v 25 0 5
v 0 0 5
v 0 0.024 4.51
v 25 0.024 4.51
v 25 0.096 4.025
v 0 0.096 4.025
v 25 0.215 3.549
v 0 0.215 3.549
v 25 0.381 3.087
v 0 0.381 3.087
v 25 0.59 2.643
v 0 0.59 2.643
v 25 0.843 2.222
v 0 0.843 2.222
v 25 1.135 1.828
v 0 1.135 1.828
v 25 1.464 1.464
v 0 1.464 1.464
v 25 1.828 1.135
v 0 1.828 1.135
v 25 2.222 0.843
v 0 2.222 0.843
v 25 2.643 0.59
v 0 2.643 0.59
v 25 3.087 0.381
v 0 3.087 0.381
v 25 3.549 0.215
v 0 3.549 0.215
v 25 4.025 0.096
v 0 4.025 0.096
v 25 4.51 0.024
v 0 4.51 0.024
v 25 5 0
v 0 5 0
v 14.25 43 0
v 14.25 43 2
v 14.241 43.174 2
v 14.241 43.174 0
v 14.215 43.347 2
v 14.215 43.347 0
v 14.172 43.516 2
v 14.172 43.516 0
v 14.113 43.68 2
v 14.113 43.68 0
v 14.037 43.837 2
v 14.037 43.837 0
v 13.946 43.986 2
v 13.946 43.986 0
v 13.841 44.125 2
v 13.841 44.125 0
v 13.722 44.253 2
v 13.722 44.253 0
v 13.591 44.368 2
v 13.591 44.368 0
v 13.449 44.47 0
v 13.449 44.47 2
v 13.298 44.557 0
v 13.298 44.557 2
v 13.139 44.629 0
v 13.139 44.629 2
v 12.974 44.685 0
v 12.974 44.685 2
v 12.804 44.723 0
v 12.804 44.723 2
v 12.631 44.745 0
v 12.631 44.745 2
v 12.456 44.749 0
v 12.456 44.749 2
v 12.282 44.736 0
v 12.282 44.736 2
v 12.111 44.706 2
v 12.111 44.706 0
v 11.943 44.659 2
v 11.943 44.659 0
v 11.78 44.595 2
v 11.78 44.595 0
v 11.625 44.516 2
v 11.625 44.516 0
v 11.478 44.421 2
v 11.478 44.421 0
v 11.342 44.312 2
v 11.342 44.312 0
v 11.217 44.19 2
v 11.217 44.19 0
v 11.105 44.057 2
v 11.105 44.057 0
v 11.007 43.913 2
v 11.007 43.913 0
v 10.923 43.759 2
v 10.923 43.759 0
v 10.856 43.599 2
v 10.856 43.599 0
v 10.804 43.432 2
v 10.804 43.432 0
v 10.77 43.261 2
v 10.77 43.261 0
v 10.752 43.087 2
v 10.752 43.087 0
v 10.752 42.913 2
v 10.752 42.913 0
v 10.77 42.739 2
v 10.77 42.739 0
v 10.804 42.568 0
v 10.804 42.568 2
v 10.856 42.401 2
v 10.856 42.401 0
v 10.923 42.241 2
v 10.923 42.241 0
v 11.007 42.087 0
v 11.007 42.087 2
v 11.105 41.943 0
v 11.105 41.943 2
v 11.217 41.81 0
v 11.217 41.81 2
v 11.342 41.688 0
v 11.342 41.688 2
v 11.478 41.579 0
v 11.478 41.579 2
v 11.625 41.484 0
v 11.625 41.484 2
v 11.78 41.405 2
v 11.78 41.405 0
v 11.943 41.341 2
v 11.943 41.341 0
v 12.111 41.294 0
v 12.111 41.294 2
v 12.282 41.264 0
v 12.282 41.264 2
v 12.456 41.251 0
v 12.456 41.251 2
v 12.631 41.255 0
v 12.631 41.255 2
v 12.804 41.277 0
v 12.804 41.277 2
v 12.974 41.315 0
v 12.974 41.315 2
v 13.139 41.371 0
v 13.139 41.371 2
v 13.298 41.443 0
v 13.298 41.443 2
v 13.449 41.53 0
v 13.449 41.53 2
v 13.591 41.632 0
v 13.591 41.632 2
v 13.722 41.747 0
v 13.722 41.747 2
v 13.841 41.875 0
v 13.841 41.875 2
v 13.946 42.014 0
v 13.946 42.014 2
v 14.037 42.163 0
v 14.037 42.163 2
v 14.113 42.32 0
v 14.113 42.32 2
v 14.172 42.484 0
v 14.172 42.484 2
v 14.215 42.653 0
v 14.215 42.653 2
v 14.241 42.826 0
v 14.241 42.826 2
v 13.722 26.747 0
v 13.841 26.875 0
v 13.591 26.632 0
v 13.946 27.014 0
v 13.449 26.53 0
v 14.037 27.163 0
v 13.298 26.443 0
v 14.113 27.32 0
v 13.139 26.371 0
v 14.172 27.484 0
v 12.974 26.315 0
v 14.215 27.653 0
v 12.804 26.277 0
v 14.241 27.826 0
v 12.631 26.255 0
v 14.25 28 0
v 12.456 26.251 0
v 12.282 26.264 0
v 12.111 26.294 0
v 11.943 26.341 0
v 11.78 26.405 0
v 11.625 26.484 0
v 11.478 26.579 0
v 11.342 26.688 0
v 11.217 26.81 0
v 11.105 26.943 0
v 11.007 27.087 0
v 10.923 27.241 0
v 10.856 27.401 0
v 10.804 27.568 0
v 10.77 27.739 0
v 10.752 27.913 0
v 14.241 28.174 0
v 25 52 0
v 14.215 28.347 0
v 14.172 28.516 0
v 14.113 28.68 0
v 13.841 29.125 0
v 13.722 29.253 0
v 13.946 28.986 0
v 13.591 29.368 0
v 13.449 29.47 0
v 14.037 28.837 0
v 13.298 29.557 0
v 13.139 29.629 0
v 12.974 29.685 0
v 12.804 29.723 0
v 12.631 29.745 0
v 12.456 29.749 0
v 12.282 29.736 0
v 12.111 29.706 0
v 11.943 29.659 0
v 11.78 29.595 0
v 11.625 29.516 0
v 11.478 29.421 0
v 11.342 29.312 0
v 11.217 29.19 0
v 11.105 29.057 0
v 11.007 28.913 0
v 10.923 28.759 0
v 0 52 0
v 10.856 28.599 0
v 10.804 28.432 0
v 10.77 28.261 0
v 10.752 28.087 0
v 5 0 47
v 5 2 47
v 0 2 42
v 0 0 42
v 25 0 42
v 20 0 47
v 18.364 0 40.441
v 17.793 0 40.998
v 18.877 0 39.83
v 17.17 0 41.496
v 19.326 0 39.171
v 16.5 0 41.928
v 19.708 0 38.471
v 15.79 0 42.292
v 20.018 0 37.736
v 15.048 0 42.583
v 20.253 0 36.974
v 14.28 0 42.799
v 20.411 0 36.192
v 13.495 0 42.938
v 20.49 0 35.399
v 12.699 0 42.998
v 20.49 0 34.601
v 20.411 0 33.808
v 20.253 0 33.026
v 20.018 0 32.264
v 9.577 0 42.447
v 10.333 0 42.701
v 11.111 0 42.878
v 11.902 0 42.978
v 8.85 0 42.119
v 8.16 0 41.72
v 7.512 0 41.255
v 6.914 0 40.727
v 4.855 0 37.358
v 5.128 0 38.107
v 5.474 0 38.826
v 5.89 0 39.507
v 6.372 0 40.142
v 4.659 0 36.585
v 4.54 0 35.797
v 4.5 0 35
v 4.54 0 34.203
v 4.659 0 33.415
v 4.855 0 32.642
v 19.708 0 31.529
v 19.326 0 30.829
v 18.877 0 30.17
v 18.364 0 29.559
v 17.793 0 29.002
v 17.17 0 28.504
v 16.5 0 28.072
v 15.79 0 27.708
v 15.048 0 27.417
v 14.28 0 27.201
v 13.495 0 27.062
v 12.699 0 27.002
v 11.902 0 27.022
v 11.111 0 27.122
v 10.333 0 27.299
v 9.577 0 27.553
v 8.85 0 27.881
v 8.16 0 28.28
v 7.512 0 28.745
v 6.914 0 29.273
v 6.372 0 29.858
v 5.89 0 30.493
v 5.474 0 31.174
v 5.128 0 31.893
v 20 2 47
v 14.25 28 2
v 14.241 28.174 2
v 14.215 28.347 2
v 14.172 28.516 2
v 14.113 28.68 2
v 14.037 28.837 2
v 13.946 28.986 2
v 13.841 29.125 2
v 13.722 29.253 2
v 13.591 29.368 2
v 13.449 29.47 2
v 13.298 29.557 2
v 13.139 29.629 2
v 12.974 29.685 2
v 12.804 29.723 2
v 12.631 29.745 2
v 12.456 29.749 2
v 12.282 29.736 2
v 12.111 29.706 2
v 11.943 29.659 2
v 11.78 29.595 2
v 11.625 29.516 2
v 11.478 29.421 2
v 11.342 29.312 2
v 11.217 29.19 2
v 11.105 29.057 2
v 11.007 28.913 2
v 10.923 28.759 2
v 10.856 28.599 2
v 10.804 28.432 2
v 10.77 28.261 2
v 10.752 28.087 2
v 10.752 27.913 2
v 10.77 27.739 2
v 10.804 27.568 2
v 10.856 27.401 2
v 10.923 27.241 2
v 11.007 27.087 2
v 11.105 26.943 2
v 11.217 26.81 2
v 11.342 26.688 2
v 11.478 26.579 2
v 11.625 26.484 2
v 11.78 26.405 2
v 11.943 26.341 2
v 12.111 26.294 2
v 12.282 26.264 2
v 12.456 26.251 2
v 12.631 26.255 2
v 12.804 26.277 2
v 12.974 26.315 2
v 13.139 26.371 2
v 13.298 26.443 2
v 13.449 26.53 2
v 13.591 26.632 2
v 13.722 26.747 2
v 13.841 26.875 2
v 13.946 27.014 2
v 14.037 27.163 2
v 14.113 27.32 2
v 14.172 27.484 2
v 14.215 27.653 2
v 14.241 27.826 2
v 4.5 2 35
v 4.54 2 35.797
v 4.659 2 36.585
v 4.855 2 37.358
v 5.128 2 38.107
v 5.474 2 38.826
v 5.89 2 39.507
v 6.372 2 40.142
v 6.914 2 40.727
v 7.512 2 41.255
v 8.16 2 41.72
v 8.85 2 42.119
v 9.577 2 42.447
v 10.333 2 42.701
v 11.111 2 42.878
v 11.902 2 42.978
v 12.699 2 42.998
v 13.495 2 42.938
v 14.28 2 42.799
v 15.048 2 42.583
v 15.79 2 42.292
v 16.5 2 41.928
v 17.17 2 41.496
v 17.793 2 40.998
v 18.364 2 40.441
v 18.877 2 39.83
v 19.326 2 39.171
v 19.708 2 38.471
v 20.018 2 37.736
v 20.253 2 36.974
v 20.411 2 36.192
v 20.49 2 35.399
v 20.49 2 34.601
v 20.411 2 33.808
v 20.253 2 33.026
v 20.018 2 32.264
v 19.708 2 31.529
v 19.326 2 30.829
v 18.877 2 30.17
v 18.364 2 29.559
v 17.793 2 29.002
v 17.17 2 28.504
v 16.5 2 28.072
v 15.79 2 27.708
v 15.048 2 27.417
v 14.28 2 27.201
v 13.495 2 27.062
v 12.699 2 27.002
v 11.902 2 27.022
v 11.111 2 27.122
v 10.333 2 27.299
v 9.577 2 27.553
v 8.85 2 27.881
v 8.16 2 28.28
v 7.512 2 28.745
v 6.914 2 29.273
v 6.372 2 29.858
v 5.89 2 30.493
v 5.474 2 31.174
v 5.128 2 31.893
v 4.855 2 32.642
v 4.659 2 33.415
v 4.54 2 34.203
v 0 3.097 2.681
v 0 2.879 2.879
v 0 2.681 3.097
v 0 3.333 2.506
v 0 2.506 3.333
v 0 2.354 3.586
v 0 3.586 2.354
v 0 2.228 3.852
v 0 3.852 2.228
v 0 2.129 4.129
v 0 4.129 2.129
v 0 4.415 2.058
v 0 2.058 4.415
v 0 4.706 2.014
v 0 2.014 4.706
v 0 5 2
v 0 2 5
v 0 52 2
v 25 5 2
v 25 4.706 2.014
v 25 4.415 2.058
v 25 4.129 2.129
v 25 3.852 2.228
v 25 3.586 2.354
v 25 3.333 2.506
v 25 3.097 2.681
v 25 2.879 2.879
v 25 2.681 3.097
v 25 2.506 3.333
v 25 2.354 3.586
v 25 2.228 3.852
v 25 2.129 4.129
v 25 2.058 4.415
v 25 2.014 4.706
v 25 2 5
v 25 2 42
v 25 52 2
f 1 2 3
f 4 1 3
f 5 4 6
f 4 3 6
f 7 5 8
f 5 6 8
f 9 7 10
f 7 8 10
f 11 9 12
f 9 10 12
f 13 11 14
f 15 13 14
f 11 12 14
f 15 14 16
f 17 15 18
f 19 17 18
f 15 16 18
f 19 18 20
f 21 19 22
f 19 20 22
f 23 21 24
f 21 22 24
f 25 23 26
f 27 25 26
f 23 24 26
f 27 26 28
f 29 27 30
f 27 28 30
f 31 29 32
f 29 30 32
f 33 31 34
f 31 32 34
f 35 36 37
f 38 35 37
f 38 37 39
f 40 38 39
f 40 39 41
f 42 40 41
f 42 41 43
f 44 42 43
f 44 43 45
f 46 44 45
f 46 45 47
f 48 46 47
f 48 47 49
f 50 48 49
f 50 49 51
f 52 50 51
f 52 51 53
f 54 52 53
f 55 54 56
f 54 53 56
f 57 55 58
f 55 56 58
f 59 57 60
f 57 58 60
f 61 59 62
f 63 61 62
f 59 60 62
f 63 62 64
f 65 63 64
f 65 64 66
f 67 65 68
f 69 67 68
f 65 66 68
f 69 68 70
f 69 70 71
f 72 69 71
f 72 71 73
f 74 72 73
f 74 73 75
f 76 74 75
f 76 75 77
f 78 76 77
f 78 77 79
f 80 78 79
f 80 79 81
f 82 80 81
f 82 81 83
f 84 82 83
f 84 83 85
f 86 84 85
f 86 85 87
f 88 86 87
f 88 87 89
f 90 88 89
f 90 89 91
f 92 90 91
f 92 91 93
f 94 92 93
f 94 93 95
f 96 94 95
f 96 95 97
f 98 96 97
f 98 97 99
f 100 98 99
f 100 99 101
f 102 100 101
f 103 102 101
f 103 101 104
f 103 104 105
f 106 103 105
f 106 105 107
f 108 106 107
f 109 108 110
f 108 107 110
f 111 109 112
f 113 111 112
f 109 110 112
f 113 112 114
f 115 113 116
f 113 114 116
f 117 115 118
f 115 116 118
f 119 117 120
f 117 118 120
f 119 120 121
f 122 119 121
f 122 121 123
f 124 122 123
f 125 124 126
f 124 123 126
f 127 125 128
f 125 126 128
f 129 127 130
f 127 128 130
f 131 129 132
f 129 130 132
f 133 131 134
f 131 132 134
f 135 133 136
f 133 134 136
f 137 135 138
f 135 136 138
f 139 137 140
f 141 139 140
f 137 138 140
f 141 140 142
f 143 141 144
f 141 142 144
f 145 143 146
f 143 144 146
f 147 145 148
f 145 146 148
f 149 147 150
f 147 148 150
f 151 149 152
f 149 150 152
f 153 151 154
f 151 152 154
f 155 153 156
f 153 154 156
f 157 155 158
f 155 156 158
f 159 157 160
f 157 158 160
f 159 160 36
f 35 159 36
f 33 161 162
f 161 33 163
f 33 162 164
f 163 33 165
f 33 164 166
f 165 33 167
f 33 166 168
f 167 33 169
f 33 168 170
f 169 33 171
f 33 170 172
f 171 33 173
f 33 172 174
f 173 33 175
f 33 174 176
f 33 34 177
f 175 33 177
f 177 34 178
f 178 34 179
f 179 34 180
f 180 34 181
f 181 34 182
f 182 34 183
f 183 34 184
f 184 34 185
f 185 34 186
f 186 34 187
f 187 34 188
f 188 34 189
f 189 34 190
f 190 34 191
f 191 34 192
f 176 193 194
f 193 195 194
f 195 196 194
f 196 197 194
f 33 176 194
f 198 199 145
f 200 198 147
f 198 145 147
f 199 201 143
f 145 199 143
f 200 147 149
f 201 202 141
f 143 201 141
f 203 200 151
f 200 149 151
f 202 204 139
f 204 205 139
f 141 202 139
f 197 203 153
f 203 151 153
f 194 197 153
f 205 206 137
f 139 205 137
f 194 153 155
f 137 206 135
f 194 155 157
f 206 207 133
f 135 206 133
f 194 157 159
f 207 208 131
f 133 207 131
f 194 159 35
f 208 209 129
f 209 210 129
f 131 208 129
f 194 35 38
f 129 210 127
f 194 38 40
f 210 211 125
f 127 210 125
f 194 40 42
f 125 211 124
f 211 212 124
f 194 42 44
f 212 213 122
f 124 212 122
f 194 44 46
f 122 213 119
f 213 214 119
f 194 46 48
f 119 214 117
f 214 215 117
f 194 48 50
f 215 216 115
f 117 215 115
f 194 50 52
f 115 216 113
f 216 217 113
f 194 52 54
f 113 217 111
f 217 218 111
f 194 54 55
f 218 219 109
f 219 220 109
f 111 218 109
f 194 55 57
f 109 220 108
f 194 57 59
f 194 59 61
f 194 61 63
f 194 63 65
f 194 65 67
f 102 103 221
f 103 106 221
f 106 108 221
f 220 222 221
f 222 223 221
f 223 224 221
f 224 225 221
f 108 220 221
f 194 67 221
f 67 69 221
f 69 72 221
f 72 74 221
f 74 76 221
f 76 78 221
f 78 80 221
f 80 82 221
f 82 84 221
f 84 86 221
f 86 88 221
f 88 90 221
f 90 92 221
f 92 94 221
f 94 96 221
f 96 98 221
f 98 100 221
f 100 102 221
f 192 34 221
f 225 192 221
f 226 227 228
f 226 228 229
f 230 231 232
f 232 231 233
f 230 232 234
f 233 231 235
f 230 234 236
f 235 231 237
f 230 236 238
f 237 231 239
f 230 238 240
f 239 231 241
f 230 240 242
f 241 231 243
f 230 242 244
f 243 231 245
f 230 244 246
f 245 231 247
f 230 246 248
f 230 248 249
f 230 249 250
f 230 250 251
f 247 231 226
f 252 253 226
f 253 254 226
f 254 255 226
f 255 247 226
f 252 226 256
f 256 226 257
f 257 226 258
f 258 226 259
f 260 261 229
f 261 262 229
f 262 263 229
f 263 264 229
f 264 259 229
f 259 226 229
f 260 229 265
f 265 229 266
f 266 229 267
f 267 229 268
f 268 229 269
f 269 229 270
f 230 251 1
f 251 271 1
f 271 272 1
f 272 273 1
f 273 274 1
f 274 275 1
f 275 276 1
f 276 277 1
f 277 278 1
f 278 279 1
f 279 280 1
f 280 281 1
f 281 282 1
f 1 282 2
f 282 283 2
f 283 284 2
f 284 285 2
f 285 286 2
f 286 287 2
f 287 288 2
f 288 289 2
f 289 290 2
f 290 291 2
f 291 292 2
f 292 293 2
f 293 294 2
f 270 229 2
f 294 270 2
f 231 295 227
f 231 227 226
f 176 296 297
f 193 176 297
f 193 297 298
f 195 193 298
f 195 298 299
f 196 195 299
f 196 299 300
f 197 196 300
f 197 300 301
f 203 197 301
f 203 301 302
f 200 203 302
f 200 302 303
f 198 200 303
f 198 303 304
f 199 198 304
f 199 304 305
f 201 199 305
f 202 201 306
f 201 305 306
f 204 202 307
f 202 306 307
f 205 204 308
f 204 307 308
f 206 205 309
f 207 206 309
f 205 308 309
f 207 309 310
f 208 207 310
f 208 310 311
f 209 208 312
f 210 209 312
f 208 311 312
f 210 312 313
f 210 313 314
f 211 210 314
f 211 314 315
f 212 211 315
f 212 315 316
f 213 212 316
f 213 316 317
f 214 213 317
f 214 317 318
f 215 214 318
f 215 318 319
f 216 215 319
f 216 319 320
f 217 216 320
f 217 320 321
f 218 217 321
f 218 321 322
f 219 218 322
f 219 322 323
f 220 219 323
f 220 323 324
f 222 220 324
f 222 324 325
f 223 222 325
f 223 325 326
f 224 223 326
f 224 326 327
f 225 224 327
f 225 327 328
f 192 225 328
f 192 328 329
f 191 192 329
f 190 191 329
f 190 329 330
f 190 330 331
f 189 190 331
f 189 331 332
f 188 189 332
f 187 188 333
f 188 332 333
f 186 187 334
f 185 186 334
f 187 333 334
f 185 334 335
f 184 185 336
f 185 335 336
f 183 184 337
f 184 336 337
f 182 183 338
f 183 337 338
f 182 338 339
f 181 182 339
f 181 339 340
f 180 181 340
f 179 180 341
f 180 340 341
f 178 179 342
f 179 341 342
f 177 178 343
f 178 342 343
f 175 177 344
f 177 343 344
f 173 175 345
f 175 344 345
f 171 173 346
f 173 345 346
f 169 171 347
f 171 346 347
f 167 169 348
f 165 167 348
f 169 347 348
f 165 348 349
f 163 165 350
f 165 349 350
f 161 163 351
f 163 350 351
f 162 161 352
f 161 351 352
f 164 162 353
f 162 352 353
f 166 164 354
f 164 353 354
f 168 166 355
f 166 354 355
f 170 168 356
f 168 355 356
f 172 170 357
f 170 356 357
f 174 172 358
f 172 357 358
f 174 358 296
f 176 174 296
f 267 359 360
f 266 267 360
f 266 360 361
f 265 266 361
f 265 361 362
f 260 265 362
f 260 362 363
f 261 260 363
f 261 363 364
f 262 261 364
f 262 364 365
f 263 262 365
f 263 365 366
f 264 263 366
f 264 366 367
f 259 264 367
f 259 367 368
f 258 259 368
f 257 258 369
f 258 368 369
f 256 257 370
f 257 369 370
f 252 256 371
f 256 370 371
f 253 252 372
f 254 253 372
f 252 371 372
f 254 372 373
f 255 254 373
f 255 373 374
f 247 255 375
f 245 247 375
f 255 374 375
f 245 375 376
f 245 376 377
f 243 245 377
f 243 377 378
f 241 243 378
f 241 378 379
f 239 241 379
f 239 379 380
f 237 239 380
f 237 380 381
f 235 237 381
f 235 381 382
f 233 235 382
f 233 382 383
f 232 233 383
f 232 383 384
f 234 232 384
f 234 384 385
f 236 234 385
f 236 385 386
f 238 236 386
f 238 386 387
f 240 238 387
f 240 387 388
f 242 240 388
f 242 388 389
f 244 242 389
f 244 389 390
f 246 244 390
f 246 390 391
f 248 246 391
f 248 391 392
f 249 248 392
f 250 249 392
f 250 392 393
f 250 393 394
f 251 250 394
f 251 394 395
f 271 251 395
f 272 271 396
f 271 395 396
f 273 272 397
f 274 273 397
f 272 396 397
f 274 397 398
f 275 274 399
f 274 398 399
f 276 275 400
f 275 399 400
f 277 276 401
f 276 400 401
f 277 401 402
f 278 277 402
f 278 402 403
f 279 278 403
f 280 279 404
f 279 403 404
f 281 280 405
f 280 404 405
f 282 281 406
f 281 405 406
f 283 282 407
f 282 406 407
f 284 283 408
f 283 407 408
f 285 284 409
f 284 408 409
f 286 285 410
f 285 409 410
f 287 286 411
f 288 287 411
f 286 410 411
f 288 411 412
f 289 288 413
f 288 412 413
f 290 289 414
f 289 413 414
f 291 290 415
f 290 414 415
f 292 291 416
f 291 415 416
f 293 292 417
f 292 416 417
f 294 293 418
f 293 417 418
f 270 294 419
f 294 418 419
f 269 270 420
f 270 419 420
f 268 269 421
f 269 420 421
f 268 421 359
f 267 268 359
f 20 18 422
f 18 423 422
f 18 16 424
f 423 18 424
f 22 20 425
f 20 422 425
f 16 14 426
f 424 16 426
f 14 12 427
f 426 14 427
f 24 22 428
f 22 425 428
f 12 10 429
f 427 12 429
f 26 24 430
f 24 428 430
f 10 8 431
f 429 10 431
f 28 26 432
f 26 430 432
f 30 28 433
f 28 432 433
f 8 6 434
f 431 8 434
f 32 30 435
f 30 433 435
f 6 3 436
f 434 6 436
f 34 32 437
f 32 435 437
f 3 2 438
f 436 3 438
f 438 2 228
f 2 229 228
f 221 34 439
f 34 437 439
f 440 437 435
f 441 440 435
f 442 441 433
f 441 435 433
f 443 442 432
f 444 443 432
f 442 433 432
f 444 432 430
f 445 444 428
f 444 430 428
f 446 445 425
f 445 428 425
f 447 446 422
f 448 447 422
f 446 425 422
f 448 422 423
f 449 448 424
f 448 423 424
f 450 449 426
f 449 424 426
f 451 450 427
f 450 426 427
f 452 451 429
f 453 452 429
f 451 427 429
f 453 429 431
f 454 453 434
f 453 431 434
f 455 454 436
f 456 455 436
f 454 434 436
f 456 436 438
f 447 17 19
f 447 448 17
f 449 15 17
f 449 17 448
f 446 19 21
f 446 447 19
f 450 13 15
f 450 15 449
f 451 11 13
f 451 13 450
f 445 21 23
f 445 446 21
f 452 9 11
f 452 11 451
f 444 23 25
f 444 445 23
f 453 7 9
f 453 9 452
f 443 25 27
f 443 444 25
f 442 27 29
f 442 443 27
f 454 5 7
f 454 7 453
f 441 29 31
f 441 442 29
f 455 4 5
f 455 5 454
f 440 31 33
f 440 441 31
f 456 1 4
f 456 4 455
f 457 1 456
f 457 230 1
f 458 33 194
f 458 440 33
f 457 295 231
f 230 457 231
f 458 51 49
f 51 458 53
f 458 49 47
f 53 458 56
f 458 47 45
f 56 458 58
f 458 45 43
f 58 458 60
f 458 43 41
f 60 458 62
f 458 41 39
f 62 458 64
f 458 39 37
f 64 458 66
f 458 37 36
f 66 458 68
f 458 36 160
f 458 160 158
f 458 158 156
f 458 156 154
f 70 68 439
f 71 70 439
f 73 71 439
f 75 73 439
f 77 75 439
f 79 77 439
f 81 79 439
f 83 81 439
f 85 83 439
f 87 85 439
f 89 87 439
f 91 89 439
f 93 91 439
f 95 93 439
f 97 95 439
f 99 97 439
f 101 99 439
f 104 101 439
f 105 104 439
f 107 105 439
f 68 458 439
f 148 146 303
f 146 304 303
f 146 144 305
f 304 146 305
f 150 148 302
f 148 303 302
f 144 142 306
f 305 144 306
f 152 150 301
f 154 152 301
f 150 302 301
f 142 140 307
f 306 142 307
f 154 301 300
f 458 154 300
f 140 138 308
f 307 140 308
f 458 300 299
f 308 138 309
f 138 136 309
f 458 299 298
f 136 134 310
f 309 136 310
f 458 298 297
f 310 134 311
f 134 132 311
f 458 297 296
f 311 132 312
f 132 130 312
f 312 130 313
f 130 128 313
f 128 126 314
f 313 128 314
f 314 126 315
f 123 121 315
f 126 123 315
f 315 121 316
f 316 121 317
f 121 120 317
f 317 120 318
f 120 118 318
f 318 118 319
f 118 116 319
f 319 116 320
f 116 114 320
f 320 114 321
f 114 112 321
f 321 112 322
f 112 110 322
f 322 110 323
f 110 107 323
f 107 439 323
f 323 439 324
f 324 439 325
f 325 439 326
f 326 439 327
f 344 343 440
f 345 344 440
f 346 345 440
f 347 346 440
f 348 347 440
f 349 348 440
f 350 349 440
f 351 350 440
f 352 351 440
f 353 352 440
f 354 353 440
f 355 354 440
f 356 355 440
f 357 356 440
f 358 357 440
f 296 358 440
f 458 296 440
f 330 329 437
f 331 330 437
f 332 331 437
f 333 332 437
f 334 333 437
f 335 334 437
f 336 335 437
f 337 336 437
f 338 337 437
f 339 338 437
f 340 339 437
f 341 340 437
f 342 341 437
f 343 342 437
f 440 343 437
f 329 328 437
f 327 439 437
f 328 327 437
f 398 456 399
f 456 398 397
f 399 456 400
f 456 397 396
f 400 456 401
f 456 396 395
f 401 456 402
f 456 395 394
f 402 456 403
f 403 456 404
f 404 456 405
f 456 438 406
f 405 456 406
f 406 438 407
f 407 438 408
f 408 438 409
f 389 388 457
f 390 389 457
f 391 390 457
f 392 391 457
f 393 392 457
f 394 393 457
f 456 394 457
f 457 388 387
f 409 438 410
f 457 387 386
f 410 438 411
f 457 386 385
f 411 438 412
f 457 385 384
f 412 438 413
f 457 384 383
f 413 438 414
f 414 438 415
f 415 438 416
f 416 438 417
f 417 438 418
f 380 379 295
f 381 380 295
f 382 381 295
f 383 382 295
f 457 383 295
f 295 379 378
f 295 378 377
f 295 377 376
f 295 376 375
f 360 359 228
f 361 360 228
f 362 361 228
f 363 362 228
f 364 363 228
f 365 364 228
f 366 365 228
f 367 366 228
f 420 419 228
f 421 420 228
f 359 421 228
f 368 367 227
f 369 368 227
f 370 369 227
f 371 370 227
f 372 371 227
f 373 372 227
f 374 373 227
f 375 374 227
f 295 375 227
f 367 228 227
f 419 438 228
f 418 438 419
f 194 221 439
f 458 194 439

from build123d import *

# Parameters (mm, degrees)
F1_DEPTH = 25
F2_R     = 8
F3_DEPTH = 25
F4_SIZE  = 5
F5_R     = 1.75
F6_DEPTH = 25


with BuildPart() as f1:
    # F0 (on Right) → F1 (new body)
    with BuildSketch(Plane.YZ):
        with BuildLine():
            Line((2, 47), (0, 47))
            Line((0, 47), (0, 5))
            ThreePointArc((0, 5), (1.464466, 1.464466), (5, 0))
            Line((5, 0), (52, 0))
            Line((52, 0), (52, 2))
            Line((52, 2), (5, 2))
            ThreePointArc((5, 2), (2.87868, 2.87868), (2, 5))
            Line((2, 5), (2, 47))
        make_face()
    extrude(amount=F1_DEPTH)

    # F2 (on face) → F3 (cut)
    with BuildSketch(Plane(origin=(0, 2, 0), x_dir=(-1, 0, 0), z_dir=(0, 1, 0))):
        with Locations((-12.5, 35)):
            Circle(F2_R)
    extrude(amount=-F3_DEPTH, mode=Mode.SUBTRACT)

    # F4
    f4_edges = [f1.edges().sort_by_distance(p)[0] for p in [
        (0, 1, 47),
        (25, 1, 47),
    ]]
    chamfer(f4_edges, length=F4_SIZE)

    # F5 (on face) → F6 (cut)
    with BuildSketch(Plane.XY.offset(2)):
        with Locations((12.5, 43)):
            Circle(F5_R)
        with Locations((12.5, 28)):
            Circle(F5_R)
    extrude(amount=-F6_DEPTH, mode=Mode.SUBTRACT)


solid = f1.part
